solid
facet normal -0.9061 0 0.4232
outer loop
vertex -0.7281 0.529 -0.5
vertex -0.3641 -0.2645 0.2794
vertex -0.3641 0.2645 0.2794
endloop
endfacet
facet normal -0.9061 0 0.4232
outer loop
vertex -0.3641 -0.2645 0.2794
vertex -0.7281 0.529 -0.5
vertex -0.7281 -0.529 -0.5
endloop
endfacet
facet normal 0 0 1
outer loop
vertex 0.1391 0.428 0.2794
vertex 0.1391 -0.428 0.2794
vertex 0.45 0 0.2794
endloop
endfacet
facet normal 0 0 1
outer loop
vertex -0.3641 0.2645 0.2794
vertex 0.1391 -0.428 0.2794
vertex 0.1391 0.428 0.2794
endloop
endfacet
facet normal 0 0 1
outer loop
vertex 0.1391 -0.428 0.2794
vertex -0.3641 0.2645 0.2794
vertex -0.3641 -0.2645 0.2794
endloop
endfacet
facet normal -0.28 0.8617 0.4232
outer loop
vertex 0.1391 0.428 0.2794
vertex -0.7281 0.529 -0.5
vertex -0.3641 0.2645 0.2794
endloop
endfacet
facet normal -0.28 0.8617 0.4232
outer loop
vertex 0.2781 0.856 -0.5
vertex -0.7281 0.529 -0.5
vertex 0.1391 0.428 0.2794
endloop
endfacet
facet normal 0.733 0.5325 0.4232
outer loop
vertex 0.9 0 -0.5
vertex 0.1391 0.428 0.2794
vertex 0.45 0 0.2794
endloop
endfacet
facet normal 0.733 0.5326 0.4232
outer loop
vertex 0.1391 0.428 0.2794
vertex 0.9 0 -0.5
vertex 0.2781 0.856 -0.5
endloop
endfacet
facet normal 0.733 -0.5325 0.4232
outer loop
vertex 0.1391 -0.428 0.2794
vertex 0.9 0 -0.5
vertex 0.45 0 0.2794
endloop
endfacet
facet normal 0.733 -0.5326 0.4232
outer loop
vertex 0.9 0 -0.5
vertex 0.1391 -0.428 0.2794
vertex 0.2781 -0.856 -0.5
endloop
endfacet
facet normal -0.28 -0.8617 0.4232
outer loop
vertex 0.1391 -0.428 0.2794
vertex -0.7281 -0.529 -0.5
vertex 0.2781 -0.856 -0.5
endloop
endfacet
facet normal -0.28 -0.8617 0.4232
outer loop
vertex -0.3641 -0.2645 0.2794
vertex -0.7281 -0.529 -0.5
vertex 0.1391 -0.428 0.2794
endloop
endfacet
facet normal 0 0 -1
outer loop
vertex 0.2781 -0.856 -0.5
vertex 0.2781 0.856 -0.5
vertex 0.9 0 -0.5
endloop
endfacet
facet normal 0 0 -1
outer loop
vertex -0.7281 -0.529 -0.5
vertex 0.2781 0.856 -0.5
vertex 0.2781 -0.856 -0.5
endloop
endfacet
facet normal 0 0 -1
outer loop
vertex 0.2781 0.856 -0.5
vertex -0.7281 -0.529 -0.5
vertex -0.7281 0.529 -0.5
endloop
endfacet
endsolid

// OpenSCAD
use <lib.scad>;

//seed = floor(rands(1,1000,1)[0]);
//seed = 268;
//seed = 431;
seed = 84;
echo(seed);

// Module randomRock : draws a random rock
module randomRock(radius,corner_size,number_of_corners) {
  // Draw rock
  hull(){
    // Make a hull..
    for(i=[0:number_of_corners]){
      // random position in 'sphere'
      y = rands(0,360,1,seed*i+1)[0];
      z = rands(0,360,1,seed*i+2)[0];
      rotate([0,y,z])

      // translate radius (minus half of corner size)
      translate([radius-corner_size*0.5,0,0])

      // draw cube as corner
      rotate([rands(0,360,1,seed*i+3)[0],rands(0,360,1,seed*i+4)[0],rands(0,360,1,seed*i+5)[0]]) // random rotation
      cube(rands(corner_size*0.5,corner_size,1,seed*i+6)[0],center = true);
    }
  }
}

// : More corners --> More 'spheric' central stone
number_of_corners = rands(15,25,1,seed+7)[0]; // [5:30]

// : Deforms central stone in vertical
stone_scale = 1; // [0.2:0.1:3]

// Number of medium size stones
medium_stones = rands(3,8,1,seed+8)[0]; // [5:30]

// Number of small stones
//small_stones = 0; //rands(3,8,1,seed+9)[0]; // [5:30]

/* [Hidden] */
radius = 20;
corner_size = 2;

module hd() {
	scale([0.05,0.05,0.05])
		translate([0,0,-10]) intersection() {
		  union(){

		    // big central stone
		    scale([1,1,stone_scale])
			    randomRock(radius,corner_size,number_of_corners);

		    // medium size stones
		    if(medium_stones>0){
		      for(i=[1:medium_stones]){
		        // random position in 'circle'
		        z = rands(0,360,1,seed*i+10)[0];
		        rotate([0,0,z])

		        // translate radius
		        translate([rands(radius*0.6,radius*0.9,1,seed*i+11)[0],0,0])
		        randomRock(rands(radius*0.3,radius*0.5,1,seed*i+12)[0],corner_size*0.5,15);
		      }
		    }
		  }
		  // cut half of figure
		  translate([-50,-50,0]) cube(100);
	}
}

module ld() {
	scale([0.05,0.05,0.05])
		translate([0,0,-10]) intersection() {
		  union() {

		    scale([1,1,stone_scale])
			    sphere(radius*0.9,$fn=5);

		    if(medium_stones > 0) {
		      for(i=[1:medium_stones]){
		        // random position in 'circle'
		        z = rands(0,360,1,seed*i+10)[0];
		        rotate([0,0,z])

		        // translate radius
		        translate([rands(radius*0.6,radius*0.9,1,seed*i+11)[0],0,0])
		        sphere(rands(radius*0.3,radius*0.5,1,seed*i+12)[0]*0.8,$fn=5);
		      }
		    }
		  }
		  // cut half of figure
		  translate([-50,-50,0]) cube(100);
		}
}

module vld() {
	scale([0.05,0.05,0.05])
		translate([0,0,-10]) intersection() {
		  union() {

		    scale([1,1,stone_scale])
			    sphere(radius*0.9,$fn=5);

//		    if(medium_stones > 0) {
//		      for(i=[1:medium_stones]){
//		        // random position in 'circle'
//		        z = rands(0,360,1,seed*i+10)[0];
//		        rotate([0,0,z])
//
//		        // translate radius
//		        translate([rands(radius*0.6,radius*0.9,1,seed*i+11)[0],0,0])
//		        sphere(rands(radius*0.3,radius*0.5,1,seed*i+12)[0]*0.8,$fn=5);
//		      }
//		    }
		  }
		  // cut half of figure
		  translate([-50,-50,0]) cube(100);
		}
}

//hd();
//ld();
vld();
